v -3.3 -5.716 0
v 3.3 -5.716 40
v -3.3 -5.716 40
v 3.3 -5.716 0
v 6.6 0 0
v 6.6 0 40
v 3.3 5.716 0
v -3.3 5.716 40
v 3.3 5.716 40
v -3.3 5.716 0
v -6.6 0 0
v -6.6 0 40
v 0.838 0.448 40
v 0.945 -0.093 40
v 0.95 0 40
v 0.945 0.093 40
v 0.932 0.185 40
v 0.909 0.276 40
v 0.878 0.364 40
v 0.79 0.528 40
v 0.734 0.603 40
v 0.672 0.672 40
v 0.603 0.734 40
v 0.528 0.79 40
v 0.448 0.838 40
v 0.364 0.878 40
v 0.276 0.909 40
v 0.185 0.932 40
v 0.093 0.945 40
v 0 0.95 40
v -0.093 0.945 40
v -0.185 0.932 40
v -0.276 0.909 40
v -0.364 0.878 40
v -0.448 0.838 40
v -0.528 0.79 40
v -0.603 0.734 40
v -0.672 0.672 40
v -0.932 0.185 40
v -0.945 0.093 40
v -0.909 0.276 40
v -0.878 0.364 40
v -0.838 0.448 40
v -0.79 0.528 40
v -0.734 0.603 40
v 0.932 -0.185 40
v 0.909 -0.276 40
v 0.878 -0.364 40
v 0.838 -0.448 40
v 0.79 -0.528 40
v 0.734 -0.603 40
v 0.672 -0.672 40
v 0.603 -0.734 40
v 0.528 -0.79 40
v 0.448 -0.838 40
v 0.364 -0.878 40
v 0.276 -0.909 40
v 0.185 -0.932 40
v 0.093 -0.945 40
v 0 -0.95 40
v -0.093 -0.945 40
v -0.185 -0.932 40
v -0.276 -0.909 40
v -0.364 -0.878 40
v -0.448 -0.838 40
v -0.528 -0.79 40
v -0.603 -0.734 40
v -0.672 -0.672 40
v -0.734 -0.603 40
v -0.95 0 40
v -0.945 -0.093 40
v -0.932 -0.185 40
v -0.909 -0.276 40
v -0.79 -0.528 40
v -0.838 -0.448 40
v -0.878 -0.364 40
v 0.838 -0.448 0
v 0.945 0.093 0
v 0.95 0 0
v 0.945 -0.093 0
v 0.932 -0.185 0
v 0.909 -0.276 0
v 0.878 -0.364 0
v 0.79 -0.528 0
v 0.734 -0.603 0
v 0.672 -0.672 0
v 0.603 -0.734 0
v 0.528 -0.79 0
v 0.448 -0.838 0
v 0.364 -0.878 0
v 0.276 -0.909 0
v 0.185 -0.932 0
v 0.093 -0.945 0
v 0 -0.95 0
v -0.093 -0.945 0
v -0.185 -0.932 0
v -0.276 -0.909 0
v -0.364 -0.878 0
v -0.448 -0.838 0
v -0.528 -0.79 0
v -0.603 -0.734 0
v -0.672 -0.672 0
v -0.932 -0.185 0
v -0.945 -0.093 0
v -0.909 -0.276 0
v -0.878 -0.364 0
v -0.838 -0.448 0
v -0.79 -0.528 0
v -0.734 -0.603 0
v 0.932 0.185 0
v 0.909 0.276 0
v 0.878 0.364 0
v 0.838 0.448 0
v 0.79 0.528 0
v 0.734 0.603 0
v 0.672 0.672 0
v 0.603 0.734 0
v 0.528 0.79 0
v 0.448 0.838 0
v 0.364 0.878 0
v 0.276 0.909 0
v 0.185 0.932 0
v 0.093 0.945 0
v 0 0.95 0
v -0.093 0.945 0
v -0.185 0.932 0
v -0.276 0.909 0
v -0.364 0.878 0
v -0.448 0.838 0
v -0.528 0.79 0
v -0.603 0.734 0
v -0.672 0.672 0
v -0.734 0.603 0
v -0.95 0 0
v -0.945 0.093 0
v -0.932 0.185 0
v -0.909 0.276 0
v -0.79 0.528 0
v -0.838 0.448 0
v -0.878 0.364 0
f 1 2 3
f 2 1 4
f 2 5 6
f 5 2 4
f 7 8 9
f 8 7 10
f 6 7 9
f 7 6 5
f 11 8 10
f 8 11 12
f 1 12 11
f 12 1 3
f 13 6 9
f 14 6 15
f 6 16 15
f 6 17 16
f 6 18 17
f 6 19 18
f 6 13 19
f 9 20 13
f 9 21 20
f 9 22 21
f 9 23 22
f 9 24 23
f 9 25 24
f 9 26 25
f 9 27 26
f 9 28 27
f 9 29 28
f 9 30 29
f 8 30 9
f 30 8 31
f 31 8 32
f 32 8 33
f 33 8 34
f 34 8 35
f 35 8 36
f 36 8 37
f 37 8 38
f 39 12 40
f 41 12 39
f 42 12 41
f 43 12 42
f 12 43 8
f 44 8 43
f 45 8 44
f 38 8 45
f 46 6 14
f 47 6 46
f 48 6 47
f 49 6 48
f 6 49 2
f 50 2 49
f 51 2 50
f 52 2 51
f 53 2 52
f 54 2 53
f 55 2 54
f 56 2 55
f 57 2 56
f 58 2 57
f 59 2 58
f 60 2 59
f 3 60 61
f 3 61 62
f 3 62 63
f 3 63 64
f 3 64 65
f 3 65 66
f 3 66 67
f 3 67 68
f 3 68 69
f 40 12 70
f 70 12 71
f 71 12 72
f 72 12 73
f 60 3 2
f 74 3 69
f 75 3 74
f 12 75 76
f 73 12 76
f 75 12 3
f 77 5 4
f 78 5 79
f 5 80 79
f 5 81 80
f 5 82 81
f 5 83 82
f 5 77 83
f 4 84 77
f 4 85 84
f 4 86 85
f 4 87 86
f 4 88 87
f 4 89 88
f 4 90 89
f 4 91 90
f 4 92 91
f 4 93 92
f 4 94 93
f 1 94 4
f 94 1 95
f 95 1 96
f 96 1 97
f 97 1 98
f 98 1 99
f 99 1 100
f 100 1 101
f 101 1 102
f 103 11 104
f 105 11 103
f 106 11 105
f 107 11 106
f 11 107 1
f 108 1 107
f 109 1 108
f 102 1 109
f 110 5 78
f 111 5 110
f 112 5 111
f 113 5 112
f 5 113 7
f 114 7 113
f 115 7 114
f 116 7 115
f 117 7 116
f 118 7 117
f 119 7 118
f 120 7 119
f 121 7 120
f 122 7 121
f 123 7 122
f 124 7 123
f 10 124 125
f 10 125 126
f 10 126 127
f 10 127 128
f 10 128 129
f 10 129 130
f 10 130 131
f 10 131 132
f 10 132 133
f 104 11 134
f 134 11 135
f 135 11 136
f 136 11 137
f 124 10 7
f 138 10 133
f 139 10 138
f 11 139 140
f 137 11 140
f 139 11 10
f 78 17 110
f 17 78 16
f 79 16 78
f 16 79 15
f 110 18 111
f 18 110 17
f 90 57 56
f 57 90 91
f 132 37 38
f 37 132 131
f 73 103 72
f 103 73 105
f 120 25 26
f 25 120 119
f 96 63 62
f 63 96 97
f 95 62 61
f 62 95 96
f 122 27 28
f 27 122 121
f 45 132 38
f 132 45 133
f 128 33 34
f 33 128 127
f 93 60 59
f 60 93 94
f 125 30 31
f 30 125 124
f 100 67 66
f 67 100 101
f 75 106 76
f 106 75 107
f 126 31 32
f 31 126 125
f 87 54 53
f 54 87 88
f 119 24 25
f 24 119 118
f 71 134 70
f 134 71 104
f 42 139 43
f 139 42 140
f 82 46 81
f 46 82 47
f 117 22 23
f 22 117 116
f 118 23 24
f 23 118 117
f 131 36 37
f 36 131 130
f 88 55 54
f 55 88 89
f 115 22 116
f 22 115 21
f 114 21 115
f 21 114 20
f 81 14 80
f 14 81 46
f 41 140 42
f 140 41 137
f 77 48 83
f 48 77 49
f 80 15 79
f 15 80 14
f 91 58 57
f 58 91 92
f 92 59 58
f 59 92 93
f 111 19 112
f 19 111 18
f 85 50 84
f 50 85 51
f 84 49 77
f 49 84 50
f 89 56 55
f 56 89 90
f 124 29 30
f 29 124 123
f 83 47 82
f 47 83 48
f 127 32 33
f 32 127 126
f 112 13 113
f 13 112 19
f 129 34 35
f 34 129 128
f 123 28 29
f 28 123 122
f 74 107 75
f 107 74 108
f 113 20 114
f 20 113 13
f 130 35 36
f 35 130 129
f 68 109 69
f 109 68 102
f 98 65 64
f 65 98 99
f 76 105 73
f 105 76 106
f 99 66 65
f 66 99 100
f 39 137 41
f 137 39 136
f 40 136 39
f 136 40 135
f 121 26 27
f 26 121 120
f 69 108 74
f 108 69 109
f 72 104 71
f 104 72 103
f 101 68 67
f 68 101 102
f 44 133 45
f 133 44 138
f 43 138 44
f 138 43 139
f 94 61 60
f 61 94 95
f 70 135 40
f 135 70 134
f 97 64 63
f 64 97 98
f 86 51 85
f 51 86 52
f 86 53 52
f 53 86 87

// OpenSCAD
difference() {
cylinder(r=6.6, h=40, $fn=6);
cylinder(r=0.95, h=40, $fn=64);
}
